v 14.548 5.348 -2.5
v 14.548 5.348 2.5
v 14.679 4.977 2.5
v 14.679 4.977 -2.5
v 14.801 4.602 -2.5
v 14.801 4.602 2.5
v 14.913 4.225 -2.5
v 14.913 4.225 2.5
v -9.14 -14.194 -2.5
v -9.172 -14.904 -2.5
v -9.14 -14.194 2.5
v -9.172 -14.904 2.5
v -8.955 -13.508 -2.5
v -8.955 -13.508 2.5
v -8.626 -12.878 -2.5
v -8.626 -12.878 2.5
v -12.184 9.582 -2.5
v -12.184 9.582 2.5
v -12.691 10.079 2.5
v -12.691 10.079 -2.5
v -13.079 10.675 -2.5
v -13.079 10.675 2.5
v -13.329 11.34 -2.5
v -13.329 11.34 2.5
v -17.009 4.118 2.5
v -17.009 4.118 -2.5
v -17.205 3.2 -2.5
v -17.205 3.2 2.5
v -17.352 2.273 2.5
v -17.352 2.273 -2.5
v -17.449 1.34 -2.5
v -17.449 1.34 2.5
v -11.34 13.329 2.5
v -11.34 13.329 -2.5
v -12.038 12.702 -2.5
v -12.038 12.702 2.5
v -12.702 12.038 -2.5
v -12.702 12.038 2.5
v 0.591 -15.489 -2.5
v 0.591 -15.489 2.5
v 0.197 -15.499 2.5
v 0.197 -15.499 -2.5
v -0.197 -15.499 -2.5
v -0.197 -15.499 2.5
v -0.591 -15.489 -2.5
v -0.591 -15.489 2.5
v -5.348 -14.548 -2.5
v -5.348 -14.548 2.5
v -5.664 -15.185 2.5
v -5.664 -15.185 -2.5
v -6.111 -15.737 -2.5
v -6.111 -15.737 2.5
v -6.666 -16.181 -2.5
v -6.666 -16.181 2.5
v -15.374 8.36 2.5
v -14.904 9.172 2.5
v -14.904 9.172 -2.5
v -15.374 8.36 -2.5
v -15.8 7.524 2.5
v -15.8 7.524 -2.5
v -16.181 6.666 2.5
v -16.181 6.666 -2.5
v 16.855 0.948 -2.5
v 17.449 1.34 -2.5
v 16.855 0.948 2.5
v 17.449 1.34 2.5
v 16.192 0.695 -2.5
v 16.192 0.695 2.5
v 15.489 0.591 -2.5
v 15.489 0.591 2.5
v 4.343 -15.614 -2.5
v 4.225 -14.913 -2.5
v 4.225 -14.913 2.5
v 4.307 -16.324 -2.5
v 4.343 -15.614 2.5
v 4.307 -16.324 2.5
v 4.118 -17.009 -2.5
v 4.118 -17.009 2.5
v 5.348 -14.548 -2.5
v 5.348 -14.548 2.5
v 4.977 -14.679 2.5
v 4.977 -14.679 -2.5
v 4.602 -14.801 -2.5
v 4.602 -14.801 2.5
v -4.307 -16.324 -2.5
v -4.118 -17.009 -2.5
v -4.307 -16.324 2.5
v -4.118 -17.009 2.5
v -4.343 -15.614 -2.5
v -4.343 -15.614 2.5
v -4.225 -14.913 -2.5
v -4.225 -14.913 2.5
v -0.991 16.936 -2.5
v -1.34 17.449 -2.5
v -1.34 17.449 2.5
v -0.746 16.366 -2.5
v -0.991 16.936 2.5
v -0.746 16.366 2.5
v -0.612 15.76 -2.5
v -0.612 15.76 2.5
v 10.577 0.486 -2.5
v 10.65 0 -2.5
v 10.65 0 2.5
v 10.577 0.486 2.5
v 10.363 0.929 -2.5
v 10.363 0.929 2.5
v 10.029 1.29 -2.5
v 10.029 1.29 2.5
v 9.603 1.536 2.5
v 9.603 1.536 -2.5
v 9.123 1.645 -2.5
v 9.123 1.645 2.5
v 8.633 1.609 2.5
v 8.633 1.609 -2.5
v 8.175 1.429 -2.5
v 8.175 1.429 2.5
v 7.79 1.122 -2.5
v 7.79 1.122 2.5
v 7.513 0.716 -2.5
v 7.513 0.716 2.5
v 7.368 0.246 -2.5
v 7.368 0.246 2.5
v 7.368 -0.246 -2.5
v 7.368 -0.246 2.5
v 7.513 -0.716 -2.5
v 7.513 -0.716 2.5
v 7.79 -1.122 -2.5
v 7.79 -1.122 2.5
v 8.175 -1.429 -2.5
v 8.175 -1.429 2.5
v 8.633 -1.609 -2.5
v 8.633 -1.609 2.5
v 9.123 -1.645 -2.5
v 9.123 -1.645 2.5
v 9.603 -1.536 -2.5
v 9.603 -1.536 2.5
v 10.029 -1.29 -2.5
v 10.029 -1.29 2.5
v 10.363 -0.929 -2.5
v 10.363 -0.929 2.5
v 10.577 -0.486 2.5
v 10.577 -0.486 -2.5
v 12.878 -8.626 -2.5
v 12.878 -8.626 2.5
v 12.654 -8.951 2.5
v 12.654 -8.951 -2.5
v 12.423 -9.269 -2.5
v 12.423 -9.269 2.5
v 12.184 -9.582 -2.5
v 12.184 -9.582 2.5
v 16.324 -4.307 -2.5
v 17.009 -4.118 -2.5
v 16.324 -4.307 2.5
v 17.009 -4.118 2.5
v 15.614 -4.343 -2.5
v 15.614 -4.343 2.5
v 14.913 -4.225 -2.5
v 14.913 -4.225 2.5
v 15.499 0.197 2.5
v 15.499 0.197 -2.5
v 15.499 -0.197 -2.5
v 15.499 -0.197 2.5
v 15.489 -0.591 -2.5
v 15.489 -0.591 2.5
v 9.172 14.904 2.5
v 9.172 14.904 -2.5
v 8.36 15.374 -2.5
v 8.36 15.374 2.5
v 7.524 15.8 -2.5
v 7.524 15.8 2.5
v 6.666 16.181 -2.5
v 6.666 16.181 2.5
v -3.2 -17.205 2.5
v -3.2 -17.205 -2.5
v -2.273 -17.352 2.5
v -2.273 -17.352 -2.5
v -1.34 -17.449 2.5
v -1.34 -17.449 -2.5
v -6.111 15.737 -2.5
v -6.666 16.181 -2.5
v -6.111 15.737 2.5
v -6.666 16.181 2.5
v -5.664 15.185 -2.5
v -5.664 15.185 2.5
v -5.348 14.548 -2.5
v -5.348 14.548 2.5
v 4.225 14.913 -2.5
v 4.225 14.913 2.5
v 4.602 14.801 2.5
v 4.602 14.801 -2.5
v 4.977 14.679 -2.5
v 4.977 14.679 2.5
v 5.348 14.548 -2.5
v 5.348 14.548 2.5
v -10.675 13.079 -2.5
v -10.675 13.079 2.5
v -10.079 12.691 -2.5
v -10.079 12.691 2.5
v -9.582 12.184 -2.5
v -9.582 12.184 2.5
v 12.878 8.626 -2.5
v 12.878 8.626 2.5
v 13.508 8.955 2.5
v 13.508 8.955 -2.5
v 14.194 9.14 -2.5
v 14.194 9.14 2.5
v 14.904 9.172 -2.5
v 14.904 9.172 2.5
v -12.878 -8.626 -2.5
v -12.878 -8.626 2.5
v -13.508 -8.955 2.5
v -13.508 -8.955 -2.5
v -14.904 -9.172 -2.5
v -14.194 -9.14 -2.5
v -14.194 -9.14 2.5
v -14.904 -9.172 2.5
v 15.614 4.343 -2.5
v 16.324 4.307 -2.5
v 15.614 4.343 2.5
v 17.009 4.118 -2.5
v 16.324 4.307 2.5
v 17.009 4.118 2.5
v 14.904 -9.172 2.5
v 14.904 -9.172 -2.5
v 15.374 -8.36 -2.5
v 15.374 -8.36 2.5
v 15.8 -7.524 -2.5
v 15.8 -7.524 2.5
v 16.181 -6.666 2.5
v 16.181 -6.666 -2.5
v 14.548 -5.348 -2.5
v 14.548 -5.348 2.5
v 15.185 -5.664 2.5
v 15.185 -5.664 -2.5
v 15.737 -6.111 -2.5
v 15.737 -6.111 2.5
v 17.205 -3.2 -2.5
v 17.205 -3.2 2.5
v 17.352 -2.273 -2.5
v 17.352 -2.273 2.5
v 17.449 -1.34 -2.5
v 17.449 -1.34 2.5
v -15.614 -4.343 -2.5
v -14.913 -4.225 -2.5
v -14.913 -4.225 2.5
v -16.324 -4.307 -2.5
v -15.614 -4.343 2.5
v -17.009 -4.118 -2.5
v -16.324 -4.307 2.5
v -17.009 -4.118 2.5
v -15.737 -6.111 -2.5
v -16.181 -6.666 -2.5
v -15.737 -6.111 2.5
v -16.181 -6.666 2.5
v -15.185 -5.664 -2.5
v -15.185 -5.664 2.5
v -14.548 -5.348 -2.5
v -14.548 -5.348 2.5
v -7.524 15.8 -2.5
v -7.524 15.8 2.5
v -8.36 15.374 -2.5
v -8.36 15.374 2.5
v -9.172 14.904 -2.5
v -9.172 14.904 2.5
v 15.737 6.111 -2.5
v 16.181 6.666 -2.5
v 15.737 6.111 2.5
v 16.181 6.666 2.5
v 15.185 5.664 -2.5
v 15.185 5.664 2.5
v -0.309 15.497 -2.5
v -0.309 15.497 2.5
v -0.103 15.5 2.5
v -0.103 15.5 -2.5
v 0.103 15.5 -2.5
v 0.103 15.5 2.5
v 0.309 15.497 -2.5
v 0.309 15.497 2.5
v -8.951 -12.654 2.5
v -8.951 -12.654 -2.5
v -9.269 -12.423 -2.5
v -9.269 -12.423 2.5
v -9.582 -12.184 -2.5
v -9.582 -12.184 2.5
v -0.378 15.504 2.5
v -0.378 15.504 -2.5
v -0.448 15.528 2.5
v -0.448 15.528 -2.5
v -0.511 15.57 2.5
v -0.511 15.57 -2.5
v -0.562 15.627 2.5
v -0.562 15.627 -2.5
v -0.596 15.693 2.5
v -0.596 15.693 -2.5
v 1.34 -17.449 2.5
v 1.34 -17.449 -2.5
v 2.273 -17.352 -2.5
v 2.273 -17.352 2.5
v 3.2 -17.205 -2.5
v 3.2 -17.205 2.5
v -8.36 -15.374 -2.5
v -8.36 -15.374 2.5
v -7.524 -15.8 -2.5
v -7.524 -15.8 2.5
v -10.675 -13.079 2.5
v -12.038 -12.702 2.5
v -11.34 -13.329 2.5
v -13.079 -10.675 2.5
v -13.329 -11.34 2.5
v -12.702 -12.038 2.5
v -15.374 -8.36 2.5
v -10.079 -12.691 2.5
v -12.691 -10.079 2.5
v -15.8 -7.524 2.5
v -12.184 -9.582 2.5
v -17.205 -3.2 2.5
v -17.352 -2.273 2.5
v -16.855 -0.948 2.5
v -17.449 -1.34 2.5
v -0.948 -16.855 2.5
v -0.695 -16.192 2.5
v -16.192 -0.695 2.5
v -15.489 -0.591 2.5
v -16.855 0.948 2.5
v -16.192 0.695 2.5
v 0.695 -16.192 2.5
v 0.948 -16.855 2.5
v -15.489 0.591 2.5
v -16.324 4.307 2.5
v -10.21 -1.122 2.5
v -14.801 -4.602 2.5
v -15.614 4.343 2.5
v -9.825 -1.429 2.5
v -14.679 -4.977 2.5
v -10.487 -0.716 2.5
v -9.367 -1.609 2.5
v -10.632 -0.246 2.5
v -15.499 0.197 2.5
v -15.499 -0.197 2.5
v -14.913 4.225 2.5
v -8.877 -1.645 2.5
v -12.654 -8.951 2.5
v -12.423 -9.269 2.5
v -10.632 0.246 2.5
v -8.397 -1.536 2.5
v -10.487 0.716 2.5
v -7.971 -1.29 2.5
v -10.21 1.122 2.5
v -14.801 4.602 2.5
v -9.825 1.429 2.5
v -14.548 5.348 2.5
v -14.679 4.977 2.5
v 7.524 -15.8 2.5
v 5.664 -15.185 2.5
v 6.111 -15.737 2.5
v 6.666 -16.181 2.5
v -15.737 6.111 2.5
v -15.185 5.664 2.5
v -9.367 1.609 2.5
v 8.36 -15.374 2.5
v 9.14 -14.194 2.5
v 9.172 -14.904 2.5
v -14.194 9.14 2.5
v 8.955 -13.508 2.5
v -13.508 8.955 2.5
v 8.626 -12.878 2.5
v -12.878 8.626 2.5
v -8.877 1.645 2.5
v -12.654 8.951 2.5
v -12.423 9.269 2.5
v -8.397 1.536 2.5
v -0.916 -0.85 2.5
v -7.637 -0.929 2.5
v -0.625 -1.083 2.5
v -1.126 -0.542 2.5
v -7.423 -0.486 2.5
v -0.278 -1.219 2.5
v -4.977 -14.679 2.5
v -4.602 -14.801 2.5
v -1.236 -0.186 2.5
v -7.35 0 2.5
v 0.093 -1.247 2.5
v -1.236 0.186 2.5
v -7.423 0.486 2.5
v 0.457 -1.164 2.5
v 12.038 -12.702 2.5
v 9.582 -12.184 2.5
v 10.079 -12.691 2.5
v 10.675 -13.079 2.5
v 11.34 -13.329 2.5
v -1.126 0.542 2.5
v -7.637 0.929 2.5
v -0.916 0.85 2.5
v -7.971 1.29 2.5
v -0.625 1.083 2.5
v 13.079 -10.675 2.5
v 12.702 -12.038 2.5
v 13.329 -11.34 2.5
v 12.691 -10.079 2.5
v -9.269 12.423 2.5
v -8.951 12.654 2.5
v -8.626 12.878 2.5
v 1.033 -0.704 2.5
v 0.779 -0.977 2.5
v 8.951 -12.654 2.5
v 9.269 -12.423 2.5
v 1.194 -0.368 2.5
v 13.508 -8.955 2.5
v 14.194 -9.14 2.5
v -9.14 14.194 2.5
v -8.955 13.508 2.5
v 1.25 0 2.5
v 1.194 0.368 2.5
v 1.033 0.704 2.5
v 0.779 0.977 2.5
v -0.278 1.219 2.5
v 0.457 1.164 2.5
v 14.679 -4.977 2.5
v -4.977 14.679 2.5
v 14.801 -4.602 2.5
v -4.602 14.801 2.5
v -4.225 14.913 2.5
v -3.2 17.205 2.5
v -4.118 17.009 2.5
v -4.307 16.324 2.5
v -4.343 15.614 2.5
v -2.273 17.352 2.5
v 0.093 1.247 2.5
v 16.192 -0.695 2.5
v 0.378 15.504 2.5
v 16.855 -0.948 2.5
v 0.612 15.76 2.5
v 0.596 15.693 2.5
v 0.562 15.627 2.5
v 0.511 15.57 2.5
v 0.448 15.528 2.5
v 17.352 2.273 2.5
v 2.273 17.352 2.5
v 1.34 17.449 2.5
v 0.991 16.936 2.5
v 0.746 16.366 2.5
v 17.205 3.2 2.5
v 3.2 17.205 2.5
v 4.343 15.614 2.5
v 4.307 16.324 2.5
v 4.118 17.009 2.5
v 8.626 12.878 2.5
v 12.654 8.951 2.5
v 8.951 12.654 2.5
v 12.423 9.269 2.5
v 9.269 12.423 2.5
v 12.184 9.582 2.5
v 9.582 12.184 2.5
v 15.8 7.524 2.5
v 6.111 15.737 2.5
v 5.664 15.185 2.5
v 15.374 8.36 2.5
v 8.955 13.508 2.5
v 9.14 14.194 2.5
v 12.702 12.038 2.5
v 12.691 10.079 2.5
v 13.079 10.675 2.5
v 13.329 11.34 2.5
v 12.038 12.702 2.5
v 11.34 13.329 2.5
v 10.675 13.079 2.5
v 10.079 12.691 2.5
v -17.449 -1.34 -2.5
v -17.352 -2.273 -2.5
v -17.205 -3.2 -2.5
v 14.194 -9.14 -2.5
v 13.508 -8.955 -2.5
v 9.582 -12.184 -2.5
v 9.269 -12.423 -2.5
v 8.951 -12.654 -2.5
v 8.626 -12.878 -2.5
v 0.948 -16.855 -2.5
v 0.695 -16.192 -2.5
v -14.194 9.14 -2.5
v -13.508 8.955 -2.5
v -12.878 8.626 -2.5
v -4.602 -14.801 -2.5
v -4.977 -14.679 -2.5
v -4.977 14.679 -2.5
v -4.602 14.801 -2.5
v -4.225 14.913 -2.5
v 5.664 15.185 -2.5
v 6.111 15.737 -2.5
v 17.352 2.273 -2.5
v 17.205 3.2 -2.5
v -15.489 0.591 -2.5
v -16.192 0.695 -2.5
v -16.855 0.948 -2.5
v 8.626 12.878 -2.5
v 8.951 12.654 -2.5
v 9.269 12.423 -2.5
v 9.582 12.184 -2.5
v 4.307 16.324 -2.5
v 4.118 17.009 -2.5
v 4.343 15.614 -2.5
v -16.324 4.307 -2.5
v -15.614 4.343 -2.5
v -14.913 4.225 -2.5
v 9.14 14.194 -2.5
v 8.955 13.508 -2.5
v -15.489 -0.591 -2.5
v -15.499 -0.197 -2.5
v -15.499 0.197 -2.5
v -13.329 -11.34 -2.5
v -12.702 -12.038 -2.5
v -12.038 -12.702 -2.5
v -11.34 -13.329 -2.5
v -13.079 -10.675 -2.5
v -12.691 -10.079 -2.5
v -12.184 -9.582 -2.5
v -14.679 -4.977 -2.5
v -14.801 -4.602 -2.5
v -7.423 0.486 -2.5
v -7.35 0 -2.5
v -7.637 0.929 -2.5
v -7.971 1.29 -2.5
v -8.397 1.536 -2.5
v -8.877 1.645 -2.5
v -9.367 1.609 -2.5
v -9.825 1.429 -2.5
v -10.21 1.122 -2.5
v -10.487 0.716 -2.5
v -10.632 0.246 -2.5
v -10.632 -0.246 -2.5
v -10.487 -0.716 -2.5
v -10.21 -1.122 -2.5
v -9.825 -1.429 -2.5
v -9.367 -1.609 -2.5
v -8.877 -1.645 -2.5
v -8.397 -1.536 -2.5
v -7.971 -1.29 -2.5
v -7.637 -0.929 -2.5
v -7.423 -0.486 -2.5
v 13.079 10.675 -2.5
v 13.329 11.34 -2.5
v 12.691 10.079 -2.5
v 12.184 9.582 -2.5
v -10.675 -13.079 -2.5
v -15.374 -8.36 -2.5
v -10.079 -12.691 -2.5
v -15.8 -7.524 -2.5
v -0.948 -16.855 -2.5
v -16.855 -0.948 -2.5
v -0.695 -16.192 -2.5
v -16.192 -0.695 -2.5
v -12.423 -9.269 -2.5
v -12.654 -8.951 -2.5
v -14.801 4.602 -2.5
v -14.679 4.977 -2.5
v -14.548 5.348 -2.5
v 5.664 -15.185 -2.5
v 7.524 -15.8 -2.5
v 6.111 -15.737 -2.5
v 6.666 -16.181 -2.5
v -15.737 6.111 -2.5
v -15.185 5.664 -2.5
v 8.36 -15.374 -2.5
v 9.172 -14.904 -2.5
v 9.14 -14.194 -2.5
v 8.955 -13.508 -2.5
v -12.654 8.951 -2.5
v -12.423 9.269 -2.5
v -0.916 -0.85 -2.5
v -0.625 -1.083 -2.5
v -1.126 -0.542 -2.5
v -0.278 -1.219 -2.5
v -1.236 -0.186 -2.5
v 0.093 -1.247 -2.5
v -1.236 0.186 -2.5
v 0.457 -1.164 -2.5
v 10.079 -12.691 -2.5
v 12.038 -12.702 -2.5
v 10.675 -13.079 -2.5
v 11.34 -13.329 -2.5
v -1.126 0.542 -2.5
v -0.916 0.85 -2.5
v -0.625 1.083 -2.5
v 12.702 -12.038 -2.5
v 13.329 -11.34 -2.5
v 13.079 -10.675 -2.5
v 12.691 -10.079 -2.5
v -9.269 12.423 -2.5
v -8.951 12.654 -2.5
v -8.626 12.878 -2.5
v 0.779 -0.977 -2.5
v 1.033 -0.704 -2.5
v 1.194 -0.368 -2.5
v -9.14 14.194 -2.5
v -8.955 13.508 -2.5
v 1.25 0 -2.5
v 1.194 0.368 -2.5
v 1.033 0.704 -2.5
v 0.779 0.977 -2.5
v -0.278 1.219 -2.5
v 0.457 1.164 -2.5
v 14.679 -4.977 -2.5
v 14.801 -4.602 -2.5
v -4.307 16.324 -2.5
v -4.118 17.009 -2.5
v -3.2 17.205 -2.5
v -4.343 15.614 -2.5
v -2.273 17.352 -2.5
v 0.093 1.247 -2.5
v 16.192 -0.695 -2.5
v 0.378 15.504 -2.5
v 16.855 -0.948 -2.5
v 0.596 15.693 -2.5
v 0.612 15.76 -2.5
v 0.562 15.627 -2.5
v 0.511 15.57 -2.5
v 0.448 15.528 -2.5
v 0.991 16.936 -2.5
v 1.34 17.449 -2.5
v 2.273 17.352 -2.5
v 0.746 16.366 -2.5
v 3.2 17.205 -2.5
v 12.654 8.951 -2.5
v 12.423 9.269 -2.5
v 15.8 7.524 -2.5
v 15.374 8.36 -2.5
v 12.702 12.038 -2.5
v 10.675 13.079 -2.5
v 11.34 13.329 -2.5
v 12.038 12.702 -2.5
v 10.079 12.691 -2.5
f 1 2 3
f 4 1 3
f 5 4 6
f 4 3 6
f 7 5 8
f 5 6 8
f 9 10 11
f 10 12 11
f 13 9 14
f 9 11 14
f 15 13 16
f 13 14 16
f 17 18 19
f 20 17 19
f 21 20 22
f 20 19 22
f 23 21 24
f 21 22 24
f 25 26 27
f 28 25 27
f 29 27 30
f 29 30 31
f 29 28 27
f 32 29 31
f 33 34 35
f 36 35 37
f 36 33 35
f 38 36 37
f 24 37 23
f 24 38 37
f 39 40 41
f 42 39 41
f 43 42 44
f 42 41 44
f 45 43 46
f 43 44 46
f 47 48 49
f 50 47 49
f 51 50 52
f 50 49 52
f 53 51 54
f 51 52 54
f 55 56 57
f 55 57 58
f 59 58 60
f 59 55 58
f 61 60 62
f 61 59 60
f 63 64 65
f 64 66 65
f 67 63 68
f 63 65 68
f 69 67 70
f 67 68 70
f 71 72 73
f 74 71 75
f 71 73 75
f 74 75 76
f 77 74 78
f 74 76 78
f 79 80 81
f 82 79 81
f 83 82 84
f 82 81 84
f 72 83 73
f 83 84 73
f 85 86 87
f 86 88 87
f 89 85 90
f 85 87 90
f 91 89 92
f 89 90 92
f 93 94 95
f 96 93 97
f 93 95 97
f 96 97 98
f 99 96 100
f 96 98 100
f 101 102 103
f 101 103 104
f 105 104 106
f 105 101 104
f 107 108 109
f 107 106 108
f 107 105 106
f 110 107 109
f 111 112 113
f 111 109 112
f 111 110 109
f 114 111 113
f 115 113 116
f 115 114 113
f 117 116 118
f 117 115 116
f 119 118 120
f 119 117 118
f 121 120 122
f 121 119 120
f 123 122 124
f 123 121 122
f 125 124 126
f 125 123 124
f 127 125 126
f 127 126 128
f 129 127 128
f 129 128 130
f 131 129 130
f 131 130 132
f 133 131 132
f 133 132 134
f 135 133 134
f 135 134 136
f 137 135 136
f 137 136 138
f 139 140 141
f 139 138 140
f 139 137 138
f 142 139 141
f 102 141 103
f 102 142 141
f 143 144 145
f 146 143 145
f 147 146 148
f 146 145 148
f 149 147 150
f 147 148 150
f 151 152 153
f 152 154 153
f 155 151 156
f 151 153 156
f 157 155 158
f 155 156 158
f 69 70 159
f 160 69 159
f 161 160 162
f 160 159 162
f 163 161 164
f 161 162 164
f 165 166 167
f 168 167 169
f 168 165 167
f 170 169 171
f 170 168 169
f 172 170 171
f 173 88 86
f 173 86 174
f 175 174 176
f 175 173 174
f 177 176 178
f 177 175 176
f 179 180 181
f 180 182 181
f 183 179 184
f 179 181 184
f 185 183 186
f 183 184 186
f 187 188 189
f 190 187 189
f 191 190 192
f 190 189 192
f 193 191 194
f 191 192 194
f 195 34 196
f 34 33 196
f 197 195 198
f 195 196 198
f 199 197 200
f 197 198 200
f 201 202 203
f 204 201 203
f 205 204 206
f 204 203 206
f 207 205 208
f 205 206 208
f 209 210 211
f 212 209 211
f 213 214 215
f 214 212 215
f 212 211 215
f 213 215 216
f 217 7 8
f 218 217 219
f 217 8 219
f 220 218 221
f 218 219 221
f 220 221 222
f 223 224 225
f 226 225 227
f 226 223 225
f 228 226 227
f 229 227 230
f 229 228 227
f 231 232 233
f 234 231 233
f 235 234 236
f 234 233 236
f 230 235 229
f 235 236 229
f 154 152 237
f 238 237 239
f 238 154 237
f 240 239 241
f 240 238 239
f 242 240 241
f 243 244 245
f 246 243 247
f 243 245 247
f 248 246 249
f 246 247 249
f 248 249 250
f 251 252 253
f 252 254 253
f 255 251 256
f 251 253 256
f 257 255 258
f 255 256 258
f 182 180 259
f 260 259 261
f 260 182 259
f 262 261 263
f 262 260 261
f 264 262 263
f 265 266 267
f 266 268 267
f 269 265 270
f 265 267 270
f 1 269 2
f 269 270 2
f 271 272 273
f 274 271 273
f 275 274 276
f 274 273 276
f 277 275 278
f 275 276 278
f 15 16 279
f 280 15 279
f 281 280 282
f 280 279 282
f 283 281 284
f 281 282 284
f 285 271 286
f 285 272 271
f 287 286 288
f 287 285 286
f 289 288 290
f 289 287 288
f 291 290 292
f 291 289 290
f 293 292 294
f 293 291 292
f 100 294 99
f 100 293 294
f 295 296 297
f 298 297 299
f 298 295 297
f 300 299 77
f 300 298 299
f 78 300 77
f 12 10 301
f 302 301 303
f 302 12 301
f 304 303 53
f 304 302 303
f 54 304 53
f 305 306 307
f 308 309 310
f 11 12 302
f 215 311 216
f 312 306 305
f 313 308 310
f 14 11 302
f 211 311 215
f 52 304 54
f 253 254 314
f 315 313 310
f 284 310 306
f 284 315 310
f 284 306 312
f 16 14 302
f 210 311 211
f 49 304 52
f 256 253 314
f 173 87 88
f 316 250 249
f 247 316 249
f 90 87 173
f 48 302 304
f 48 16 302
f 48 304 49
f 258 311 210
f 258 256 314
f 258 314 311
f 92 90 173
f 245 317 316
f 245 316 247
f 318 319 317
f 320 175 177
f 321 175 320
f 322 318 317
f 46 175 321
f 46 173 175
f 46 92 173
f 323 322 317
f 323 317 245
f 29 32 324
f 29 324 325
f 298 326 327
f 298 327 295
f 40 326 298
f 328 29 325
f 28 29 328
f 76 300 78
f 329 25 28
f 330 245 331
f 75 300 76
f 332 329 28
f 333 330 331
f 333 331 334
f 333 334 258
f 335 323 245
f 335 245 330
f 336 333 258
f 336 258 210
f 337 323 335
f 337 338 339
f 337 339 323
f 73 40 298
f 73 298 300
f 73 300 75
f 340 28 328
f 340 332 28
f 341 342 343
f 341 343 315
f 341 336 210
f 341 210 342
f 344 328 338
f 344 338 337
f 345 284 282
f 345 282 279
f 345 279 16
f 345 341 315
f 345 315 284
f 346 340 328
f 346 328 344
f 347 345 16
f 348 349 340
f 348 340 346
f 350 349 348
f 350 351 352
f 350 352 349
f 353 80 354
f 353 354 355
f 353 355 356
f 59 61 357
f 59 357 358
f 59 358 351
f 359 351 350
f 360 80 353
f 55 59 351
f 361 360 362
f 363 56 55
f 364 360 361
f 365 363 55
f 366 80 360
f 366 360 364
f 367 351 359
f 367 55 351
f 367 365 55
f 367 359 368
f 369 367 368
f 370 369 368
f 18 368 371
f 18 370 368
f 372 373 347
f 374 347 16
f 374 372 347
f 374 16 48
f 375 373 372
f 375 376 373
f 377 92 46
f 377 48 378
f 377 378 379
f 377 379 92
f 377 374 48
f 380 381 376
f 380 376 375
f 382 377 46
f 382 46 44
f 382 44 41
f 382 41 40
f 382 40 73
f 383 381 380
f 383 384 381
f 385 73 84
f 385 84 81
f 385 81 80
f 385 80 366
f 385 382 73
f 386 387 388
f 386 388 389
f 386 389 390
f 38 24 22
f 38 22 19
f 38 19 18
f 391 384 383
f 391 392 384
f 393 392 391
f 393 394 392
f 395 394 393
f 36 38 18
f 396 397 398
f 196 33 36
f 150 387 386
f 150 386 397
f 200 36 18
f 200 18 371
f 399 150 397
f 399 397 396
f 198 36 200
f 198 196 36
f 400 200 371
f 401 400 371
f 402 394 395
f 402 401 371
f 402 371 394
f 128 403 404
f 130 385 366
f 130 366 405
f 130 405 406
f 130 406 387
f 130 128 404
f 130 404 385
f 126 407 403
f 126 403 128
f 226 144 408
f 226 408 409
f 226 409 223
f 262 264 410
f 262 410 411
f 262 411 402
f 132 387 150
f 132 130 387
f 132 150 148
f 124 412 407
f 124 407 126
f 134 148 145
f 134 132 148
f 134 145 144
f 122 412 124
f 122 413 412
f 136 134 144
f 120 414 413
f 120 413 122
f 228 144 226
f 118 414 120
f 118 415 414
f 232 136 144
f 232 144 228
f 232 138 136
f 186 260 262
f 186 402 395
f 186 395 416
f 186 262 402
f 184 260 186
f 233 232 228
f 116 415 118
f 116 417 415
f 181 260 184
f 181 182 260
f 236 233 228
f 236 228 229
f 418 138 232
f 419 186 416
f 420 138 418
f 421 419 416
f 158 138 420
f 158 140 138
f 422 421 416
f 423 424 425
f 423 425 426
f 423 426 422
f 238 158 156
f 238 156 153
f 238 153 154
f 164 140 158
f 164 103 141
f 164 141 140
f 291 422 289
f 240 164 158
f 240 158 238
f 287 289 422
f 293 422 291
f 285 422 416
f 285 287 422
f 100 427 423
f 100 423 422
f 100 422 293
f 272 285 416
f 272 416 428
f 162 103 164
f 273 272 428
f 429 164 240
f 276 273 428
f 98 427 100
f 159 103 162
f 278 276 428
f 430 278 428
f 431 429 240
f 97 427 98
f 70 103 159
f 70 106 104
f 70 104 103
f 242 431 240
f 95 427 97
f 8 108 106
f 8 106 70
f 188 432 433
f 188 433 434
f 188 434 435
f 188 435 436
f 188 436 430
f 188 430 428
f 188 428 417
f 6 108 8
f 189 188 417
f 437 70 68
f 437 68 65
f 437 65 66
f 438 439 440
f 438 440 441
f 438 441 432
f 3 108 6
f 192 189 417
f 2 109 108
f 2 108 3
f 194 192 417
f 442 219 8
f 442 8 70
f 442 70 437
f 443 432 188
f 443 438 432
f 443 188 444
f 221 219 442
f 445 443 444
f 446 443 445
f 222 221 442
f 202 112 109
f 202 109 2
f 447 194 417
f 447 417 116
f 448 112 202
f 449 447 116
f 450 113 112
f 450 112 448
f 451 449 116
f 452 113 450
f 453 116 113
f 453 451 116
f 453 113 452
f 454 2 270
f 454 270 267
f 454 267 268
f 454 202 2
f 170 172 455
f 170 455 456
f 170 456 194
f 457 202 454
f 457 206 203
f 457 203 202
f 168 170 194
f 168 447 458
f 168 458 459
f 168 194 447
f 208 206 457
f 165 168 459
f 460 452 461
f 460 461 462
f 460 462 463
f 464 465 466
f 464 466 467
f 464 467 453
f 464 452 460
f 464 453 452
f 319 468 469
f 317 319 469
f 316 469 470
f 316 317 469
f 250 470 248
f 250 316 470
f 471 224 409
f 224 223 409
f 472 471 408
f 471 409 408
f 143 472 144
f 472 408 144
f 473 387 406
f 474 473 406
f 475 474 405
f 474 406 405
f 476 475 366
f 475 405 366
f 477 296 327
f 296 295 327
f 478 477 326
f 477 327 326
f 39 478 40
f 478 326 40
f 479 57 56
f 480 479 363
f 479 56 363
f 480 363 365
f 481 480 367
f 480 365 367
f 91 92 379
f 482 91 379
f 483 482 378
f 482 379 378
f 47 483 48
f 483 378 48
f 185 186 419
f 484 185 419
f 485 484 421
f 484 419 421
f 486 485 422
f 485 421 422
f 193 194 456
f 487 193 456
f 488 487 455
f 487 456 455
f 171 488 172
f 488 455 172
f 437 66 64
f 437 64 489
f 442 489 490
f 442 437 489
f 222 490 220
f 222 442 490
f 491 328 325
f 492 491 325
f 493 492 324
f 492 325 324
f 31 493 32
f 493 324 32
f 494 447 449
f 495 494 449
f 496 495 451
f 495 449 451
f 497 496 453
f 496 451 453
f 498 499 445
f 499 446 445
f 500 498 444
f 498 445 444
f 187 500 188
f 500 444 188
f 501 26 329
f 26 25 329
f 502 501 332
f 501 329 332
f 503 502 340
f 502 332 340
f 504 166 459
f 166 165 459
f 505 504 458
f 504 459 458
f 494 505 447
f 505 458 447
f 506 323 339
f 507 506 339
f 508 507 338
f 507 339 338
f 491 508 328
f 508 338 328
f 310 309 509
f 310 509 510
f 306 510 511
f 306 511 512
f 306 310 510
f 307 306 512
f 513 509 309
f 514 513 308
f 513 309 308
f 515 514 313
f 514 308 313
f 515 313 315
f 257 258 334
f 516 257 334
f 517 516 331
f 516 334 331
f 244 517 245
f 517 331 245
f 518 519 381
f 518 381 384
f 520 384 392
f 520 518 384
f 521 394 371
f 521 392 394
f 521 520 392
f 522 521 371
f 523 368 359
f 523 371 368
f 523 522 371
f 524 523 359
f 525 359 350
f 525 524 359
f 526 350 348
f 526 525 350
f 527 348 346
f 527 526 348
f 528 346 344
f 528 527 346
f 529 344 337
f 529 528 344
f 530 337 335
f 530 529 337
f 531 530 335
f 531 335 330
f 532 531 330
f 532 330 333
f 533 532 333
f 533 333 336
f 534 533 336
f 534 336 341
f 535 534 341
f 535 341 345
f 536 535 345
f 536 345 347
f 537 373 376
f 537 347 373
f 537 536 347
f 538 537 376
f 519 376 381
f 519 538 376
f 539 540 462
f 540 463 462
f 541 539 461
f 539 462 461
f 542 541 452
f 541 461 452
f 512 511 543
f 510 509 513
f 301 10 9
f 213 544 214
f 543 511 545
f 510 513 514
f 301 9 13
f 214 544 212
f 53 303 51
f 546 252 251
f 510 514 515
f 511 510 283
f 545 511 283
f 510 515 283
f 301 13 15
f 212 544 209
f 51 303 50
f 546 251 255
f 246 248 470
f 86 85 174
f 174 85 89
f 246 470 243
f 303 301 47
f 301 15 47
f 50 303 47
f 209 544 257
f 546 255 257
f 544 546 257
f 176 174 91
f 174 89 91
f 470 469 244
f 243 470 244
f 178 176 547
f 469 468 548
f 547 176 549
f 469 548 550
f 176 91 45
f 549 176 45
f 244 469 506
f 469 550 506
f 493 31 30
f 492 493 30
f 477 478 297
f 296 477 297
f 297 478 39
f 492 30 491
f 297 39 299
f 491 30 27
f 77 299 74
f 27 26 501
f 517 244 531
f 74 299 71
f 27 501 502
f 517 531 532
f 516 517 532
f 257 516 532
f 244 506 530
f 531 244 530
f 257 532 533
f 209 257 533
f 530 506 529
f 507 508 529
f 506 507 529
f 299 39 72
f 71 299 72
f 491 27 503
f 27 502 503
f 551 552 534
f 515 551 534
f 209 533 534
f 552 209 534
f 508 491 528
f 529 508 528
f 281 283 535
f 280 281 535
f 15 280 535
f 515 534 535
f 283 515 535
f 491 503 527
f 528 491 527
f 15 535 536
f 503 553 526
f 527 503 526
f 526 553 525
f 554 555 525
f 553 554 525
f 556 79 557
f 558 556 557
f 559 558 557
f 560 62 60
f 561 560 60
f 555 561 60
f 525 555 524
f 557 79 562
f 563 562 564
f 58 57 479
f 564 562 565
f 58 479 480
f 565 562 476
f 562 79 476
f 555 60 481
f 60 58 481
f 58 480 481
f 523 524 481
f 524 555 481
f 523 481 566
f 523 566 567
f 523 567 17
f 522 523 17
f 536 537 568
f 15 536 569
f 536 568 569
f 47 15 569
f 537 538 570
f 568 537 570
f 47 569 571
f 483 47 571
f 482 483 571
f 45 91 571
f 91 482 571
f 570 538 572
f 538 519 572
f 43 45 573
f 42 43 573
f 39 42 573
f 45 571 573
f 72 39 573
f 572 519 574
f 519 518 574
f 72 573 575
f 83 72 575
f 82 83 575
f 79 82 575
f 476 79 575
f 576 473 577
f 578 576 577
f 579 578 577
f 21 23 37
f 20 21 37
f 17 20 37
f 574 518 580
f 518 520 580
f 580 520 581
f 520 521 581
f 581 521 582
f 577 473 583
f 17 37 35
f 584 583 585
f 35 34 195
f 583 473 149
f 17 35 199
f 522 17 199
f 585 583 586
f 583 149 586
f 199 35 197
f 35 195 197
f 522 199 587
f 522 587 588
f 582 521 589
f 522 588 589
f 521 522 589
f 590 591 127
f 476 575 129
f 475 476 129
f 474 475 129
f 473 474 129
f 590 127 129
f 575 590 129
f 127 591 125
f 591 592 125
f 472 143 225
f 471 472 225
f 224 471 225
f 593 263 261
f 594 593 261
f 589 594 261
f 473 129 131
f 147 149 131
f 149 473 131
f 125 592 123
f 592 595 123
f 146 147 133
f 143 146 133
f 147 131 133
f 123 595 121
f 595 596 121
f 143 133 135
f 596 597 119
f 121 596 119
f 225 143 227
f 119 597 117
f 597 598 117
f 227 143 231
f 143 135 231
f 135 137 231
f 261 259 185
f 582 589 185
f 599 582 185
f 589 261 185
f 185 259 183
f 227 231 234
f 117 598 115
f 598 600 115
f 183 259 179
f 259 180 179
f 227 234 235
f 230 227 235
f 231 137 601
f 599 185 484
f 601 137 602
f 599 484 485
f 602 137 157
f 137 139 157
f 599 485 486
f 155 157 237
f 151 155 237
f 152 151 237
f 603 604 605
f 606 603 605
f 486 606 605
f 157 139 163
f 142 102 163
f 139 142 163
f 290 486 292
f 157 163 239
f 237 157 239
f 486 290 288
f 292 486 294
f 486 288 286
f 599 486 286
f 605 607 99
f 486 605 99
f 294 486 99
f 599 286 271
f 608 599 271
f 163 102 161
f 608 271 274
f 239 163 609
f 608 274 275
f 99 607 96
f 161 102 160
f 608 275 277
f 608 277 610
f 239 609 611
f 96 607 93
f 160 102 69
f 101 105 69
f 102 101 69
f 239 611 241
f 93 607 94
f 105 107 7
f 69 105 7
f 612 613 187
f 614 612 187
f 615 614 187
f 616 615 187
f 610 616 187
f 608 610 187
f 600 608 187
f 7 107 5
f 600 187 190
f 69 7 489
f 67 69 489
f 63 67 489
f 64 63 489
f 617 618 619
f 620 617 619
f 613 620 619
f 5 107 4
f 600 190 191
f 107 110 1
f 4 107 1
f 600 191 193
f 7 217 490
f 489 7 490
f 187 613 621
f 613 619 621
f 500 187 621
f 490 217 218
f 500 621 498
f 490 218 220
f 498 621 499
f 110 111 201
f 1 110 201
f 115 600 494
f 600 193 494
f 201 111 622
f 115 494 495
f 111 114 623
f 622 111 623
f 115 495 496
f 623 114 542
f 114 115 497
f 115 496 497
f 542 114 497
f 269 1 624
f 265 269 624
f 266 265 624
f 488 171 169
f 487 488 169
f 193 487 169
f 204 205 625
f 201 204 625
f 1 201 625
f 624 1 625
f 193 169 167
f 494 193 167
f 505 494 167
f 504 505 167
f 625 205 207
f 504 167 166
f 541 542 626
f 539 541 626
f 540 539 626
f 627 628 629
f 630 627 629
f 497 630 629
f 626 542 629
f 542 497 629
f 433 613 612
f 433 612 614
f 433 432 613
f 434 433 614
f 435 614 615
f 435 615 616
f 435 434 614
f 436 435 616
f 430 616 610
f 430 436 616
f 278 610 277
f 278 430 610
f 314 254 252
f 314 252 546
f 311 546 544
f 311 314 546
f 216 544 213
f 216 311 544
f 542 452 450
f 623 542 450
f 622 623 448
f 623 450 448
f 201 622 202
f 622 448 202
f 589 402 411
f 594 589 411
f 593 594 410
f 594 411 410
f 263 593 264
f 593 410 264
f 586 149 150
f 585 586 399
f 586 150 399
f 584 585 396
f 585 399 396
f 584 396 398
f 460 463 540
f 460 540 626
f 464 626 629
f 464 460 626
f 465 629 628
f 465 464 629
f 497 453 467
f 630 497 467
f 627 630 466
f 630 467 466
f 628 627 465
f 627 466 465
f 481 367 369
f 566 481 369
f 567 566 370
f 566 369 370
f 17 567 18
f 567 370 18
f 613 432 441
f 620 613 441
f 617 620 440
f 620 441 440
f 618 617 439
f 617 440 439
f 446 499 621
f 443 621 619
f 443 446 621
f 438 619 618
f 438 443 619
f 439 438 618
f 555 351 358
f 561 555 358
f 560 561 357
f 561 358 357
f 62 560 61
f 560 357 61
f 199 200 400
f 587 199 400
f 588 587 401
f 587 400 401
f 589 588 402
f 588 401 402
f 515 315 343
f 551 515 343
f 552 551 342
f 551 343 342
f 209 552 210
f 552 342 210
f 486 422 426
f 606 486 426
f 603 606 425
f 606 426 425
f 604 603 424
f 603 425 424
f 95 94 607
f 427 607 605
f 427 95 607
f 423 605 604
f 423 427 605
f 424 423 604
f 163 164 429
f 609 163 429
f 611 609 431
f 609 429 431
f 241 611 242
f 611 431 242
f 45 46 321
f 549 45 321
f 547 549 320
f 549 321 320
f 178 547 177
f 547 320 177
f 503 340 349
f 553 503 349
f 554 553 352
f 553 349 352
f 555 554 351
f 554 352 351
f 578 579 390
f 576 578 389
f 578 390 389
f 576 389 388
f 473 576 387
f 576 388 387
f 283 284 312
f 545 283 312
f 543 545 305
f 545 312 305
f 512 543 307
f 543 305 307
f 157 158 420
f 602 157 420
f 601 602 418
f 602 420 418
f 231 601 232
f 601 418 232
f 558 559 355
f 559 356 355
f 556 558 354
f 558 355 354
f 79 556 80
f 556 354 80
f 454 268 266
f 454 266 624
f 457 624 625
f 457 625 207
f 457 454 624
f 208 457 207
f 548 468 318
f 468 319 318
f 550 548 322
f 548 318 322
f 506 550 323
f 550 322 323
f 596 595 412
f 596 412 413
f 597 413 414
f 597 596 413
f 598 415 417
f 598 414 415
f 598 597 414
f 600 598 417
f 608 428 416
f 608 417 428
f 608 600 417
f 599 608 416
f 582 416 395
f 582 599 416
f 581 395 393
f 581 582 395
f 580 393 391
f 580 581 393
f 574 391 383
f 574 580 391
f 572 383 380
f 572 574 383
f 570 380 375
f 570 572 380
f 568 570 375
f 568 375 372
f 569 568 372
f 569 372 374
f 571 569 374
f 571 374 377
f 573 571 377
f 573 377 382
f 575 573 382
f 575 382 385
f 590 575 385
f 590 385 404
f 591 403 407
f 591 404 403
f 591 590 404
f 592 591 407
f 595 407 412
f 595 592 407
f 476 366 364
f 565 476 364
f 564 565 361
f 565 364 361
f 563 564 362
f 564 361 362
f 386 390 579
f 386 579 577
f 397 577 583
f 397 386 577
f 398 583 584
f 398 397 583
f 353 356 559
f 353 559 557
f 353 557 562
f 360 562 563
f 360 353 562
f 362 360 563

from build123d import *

# Parameters (mm, degrees)
SKETCH1_R                      = 17.5
BOSS_EXTRUDE1_DEPTH            = 2.5
CUT_EXTRUDE1_DEPTH             = 25.874685928
FILLET2_R                      = 0.3
CIRPATTERN1_COUNT              = 20
THROUGH_CENTER_HOLE_DEPTH      = 25.802421489
THROUGH_CENTER_HOLE_DEPTH_BACK = 25.802421489
SKETCH4_R                      = 1.25
TO_KNUCKLE_MOUNT_DEPTH         = 25.802421489
TO_KNUCKLE_MOUNT_DEPTH_BACK    = 25.802421489
SKETCH5_R                      = 1.65


with BuildPart() as part:
    # Sketch1 → Boss-Extrude1 (new, symmetric)
    with BuildSketch(Plane.XY):
        Circle(SKETCH1_R)
    extrude(amount=BOSS_EXTRUDE1_DEPTH, both=True)

    # Sketch3 → Cut-Extrude1 (cut, symmetric)
    with BuildSketch(Plane.XY):
        with BuildLine():
            ThreePointArc((-2.489947944, 18.331670934), (-1.138475024, 17.178633755), (-0.590517817, 15.488747164))
            ThreePointArc((-0.590517817, 15.488747164), (0, 15.5), (0.590517817, 15.488747164))
            ThreePointArc((0.590517817, 15.488747164), (1.138475024, 17.178633755), (2.489947944, 18.331670934))
            ThreePointArc((2.489947944, 18.331670934), (0, 18.5), (-2.489947944, 18.331670934))
        make_face()
    cut_extrude1 = extrude(amount=CUT_EXTRUDE1_DEPTH, both=True, mode=Mode.SUBTRACT)

    # Fillet2
    fillet2_edges = [part.edges().sort_by_distance(p)[0] for p in [
        (-0.590517817, 15.488747164, 0),
        (0.590517817, 15.488747164, 0),
    ]]
    fillet(fillet2_edges, radius=FILLET2_R)

    # CirPattern1: Cut-Extrude1 ×20 about axis
    cirpattern1_axis = Axis((0, 0, 0), (0, 0, 1))
    for i in range(1, CIRPATTERN1_COUNT):
        add(cut_extrude1.rotate(cirpattern1_axis, i * 360 / CIRPATTERN1_COUNT), mode=Mode.SUBTRACT)

    # Sketch4 → Through_Center_Hole (cut, two sides: drawn at the far end of the back side and taken through both)
    with BuildSketch(Plane.XY.offset(-THROUGH_CENTER_HOLE_DEPTH_BACK)):
        Circle(SKETCH4_R)
    extrude(amount=THROUGH_CENTER_HOLE_DEPTH + THROUGH_CENTER_HOLE_DEPTH_BACK, mode=Mode.SUBTRACT)

    # Sketch5 → To_Knuckle_Mount (cut, two sides: drawn at the far end of the back side and taken through both)
    with BuildSketch(Plane.XY.offset(-TO_KNUCKLE_MOUNT_DEPTH_BACK)):
        with Locations((9, 0)):
            Circle(SKETCH5_R)
        with Locations((-9, 0)):
            Circle(SKETCH5_R)
    extrude(amount=TO_KNUCKLE_MOUNT_DEPTH + TO_KNUCKLE_MOUNT_DEPTH_BACK, mode=Mode.SUBTRACT)


solid = part.part
